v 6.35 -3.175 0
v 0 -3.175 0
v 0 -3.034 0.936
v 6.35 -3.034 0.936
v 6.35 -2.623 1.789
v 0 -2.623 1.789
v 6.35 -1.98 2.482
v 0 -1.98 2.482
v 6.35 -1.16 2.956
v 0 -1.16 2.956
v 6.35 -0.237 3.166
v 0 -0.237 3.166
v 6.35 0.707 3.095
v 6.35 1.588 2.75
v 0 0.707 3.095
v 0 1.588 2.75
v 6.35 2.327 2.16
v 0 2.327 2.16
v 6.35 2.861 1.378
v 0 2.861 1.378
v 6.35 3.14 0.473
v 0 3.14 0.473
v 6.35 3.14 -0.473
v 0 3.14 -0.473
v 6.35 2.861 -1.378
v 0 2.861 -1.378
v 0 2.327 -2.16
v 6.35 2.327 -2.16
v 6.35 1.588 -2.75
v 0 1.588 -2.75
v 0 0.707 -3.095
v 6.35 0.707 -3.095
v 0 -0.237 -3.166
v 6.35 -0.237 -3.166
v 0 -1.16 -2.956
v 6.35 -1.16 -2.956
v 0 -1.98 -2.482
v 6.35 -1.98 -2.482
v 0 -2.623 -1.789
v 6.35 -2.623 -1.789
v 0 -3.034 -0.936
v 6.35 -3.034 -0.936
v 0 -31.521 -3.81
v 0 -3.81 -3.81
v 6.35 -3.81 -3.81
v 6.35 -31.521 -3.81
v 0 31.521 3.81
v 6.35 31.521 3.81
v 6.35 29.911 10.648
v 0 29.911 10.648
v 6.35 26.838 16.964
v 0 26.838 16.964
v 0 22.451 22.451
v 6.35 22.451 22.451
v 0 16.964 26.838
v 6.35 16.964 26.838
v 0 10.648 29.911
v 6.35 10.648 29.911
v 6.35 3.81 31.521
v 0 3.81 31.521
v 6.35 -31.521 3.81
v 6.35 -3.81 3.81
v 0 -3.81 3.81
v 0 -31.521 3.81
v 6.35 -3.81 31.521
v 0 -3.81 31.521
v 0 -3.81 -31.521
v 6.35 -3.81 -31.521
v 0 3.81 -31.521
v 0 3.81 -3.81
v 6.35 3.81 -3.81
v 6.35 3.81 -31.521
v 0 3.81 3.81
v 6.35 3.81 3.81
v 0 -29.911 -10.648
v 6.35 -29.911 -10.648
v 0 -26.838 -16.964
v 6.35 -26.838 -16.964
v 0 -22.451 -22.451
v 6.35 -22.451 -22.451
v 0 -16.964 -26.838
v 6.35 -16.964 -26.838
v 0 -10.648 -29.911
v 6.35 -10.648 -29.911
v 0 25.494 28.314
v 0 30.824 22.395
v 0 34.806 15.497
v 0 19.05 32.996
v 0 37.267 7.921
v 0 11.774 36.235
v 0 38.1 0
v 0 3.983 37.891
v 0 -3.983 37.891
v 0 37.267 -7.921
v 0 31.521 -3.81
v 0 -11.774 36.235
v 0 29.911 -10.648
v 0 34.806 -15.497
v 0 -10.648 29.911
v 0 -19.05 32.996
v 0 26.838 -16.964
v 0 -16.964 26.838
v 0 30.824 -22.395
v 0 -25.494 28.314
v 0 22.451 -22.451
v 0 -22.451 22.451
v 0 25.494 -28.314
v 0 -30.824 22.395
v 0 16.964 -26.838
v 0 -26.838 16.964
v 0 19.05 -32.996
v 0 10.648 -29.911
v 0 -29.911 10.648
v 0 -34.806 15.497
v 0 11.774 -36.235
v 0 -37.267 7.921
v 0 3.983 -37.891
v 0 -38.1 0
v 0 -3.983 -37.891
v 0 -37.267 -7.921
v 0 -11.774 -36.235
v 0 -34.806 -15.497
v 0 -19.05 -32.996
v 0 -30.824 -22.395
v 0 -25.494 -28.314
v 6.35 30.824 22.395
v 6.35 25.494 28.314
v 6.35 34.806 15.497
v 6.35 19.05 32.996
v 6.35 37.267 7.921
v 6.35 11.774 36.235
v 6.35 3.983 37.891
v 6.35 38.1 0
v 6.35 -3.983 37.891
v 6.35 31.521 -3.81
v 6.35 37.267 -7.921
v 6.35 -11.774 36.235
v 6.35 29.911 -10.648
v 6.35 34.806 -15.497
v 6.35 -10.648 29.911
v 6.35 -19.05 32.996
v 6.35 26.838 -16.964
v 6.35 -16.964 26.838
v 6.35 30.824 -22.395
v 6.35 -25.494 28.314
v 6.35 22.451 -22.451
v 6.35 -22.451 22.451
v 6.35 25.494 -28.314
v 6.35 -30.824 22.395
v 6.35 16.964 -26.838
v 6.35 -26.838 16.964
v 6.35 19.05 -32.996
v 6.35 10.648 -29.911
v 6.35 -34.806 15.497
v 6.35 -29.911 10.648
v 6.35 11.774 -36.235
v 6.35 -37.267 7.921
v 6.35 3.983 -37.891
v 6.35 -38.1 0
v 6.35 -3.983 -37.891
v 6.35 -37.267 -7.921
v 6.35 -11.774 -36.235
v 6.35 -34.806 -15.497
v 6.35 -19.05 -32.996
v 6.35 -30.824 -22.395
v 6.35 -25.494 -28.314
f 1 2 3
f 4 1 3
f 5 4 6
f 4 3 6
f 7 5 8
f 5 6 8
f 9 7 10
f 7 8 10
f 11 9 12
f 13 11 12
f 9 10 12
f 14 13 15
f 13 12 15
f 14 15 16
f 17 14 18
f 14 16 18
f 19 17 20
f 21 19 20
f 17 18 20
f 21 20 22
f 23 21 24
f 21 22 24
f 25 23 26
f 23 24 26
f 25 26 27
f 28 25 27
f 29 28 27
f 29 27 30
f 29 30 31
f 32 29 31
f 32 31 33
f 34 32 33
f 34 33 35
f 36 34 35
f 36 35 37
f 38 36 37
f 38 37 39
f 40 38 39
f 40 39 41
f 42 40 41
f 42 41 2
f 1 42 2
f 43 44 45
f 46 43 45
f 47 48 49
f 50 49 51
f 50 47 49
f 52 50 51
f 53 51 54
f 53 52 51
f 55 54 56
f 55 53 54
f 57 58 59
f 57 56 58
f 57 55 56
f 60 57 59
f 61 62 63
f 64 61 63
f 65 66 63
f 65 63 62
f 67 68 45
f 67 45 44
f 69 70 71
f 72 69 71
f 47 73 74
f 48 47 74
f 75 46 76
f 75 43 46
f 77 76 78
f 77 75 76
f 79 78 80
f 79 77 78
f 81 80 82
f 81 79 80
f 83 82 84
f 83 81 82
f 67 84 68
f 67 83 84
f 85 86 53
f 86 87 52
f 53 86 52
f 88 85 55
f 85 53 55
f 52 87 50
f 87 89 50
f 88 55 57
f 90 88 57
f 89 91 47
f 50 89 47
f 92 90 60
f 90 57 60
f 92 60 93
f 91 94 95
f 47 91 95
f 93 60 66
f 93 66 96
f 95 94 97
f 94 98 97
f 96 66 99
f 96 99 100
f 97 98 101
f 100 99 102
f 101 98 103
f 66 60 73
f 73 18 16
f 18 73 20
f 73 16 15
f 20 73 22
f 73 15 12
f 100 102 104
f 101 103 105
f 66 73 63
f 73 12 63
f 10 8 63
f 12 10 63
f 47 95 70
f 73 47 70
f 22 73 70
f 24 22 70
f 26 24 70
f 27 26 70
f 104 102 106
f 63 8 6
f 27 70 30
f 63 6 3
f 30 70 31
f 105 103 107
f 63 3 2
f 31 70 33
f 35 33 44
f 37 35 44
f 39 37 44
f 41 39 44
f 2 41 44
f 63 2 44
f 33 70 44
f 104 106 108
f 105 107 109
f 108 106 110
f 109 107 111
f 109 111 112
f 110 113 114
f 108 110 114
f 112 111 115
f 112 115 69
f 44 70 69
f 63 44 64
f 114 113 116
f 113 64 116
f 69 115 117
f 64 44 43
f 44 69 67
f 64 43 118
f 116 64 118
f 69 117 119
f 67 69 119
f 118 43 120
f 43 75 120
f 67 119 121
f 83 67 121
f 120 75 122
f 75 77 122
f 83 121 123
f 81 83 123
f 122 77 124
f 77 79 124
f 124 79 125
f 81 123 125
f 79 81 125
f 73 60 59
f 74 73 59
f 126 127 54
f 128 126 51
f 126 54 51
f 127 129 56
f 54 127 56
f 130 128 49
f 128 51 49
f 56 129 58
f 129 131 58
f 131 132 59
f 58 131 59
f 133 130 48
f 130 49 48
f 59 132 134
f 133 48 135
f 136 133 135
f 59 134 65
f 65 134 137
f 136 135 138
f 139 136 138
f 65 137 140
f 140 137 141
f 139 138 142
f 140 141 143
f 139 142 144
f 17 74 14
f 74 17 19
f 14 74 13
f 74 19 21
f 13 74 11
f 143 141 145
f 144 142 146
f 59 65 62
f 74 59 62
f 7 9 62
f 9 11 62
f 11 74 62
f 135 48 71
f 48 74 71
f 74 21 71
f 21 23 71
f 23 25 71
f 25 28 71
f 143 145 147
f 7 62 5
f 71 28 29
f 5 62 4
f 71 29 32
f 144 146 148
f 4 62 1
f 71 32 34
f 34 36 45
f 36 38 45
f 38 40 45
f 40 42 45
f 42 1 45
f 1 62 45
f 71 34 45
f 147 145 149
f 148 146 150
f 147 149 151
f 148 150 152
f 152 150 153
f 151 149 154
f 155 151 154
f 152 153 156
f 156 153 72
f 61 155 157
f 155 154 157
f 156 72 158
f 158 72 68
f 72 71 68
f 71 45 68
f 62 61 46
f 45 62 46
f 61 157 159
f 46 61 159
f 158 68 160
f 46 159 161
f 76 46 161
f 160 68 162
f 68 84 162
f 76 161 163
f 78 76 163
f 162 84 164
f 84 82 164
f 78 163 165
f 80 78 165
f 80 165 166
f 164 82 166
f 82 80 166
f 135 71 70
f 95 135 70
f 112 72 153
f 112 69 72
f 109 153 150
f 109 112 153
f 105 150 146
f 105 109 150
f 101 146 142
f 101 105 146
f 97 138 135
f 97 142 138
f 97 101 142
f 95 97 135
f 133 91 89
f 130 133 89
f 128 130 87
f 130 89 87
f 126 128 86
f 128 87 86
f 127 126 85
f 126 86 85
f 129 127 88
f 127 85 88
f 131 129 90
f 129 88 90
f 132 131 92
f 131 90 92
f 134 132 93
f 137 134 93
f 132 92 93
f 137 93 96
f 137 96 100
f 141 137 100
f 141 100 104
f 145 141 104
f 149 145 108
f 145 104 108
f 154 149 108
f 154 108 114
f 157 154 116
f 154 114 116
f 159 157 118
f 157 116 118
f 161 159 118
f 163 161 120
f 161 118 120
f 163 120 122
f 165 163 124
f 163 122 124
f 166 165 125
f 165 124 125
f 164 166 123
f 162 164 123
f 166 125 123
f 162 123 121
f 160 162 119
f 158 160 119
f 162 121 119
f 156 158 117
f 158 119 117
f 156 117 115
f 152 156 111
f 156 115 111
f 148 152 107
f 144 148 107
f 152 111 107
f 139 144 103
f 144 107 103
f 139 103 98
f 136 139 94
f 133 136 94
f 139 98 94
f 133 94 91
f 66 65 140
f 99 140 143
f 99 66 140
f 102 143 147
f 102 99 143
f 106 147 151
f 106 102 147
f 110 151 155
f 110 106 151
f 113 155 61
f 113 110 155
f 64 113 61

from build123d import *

# Parameters (mm, degrees)
F0_R     = 38.1
F0_R_2   = 31.75
F1_DEPTH = 6.35
F3_DEPTH = 33.02
F4_COUNT = 4
F4_ANGLE = 270
F5_R     = 3.175
F6_DEPTH = 25.4


with BuildPart() as f1:
    # F0 (on Right) → F1 (new body)
    with BuildSketch(Plane.YZ):
        Circle(F0_R)
        Circle(F0_R_2, mode=Mode.SUBTRACT)
    extrude(amount=F1_DEPTH)



with BuildPart() as f3:
    # F2 (on Top) → F3 (new body)
    with BuildSketch(Plane.XY):
        Polygon((0, 3.81), (0, 0), (0, -3.81), (6.35, -3.81), (6.35, 3.81), align=None)
    extrude(amount=F3_DEPTH)


with BuildPart() as f1_1:
    add(f1.part)

    add(f3.part)  # F4 merges F3
    # F4: F3 ×4 about axis
    f4_axis = Axis((6.35, 0, 0), (1, 0, 0))
    for i in range(1, F4_COUNT):
        add(f3.part.rotate(f4_axis, i * F4_ANGLE / (F4_COUNT - 1)))

    # F5 (on face) → F6 (cut)
    with BuildSketch(Plane(origin=(0, 0, 0), x_dir=(0, -1, 0), z_dir=(-1, 0, 0))):
        Circle(F5_R)
    extrude(amount=-F6_DEPTH, mode=Mode.SUBTRACT)


solid = f1_1.part
